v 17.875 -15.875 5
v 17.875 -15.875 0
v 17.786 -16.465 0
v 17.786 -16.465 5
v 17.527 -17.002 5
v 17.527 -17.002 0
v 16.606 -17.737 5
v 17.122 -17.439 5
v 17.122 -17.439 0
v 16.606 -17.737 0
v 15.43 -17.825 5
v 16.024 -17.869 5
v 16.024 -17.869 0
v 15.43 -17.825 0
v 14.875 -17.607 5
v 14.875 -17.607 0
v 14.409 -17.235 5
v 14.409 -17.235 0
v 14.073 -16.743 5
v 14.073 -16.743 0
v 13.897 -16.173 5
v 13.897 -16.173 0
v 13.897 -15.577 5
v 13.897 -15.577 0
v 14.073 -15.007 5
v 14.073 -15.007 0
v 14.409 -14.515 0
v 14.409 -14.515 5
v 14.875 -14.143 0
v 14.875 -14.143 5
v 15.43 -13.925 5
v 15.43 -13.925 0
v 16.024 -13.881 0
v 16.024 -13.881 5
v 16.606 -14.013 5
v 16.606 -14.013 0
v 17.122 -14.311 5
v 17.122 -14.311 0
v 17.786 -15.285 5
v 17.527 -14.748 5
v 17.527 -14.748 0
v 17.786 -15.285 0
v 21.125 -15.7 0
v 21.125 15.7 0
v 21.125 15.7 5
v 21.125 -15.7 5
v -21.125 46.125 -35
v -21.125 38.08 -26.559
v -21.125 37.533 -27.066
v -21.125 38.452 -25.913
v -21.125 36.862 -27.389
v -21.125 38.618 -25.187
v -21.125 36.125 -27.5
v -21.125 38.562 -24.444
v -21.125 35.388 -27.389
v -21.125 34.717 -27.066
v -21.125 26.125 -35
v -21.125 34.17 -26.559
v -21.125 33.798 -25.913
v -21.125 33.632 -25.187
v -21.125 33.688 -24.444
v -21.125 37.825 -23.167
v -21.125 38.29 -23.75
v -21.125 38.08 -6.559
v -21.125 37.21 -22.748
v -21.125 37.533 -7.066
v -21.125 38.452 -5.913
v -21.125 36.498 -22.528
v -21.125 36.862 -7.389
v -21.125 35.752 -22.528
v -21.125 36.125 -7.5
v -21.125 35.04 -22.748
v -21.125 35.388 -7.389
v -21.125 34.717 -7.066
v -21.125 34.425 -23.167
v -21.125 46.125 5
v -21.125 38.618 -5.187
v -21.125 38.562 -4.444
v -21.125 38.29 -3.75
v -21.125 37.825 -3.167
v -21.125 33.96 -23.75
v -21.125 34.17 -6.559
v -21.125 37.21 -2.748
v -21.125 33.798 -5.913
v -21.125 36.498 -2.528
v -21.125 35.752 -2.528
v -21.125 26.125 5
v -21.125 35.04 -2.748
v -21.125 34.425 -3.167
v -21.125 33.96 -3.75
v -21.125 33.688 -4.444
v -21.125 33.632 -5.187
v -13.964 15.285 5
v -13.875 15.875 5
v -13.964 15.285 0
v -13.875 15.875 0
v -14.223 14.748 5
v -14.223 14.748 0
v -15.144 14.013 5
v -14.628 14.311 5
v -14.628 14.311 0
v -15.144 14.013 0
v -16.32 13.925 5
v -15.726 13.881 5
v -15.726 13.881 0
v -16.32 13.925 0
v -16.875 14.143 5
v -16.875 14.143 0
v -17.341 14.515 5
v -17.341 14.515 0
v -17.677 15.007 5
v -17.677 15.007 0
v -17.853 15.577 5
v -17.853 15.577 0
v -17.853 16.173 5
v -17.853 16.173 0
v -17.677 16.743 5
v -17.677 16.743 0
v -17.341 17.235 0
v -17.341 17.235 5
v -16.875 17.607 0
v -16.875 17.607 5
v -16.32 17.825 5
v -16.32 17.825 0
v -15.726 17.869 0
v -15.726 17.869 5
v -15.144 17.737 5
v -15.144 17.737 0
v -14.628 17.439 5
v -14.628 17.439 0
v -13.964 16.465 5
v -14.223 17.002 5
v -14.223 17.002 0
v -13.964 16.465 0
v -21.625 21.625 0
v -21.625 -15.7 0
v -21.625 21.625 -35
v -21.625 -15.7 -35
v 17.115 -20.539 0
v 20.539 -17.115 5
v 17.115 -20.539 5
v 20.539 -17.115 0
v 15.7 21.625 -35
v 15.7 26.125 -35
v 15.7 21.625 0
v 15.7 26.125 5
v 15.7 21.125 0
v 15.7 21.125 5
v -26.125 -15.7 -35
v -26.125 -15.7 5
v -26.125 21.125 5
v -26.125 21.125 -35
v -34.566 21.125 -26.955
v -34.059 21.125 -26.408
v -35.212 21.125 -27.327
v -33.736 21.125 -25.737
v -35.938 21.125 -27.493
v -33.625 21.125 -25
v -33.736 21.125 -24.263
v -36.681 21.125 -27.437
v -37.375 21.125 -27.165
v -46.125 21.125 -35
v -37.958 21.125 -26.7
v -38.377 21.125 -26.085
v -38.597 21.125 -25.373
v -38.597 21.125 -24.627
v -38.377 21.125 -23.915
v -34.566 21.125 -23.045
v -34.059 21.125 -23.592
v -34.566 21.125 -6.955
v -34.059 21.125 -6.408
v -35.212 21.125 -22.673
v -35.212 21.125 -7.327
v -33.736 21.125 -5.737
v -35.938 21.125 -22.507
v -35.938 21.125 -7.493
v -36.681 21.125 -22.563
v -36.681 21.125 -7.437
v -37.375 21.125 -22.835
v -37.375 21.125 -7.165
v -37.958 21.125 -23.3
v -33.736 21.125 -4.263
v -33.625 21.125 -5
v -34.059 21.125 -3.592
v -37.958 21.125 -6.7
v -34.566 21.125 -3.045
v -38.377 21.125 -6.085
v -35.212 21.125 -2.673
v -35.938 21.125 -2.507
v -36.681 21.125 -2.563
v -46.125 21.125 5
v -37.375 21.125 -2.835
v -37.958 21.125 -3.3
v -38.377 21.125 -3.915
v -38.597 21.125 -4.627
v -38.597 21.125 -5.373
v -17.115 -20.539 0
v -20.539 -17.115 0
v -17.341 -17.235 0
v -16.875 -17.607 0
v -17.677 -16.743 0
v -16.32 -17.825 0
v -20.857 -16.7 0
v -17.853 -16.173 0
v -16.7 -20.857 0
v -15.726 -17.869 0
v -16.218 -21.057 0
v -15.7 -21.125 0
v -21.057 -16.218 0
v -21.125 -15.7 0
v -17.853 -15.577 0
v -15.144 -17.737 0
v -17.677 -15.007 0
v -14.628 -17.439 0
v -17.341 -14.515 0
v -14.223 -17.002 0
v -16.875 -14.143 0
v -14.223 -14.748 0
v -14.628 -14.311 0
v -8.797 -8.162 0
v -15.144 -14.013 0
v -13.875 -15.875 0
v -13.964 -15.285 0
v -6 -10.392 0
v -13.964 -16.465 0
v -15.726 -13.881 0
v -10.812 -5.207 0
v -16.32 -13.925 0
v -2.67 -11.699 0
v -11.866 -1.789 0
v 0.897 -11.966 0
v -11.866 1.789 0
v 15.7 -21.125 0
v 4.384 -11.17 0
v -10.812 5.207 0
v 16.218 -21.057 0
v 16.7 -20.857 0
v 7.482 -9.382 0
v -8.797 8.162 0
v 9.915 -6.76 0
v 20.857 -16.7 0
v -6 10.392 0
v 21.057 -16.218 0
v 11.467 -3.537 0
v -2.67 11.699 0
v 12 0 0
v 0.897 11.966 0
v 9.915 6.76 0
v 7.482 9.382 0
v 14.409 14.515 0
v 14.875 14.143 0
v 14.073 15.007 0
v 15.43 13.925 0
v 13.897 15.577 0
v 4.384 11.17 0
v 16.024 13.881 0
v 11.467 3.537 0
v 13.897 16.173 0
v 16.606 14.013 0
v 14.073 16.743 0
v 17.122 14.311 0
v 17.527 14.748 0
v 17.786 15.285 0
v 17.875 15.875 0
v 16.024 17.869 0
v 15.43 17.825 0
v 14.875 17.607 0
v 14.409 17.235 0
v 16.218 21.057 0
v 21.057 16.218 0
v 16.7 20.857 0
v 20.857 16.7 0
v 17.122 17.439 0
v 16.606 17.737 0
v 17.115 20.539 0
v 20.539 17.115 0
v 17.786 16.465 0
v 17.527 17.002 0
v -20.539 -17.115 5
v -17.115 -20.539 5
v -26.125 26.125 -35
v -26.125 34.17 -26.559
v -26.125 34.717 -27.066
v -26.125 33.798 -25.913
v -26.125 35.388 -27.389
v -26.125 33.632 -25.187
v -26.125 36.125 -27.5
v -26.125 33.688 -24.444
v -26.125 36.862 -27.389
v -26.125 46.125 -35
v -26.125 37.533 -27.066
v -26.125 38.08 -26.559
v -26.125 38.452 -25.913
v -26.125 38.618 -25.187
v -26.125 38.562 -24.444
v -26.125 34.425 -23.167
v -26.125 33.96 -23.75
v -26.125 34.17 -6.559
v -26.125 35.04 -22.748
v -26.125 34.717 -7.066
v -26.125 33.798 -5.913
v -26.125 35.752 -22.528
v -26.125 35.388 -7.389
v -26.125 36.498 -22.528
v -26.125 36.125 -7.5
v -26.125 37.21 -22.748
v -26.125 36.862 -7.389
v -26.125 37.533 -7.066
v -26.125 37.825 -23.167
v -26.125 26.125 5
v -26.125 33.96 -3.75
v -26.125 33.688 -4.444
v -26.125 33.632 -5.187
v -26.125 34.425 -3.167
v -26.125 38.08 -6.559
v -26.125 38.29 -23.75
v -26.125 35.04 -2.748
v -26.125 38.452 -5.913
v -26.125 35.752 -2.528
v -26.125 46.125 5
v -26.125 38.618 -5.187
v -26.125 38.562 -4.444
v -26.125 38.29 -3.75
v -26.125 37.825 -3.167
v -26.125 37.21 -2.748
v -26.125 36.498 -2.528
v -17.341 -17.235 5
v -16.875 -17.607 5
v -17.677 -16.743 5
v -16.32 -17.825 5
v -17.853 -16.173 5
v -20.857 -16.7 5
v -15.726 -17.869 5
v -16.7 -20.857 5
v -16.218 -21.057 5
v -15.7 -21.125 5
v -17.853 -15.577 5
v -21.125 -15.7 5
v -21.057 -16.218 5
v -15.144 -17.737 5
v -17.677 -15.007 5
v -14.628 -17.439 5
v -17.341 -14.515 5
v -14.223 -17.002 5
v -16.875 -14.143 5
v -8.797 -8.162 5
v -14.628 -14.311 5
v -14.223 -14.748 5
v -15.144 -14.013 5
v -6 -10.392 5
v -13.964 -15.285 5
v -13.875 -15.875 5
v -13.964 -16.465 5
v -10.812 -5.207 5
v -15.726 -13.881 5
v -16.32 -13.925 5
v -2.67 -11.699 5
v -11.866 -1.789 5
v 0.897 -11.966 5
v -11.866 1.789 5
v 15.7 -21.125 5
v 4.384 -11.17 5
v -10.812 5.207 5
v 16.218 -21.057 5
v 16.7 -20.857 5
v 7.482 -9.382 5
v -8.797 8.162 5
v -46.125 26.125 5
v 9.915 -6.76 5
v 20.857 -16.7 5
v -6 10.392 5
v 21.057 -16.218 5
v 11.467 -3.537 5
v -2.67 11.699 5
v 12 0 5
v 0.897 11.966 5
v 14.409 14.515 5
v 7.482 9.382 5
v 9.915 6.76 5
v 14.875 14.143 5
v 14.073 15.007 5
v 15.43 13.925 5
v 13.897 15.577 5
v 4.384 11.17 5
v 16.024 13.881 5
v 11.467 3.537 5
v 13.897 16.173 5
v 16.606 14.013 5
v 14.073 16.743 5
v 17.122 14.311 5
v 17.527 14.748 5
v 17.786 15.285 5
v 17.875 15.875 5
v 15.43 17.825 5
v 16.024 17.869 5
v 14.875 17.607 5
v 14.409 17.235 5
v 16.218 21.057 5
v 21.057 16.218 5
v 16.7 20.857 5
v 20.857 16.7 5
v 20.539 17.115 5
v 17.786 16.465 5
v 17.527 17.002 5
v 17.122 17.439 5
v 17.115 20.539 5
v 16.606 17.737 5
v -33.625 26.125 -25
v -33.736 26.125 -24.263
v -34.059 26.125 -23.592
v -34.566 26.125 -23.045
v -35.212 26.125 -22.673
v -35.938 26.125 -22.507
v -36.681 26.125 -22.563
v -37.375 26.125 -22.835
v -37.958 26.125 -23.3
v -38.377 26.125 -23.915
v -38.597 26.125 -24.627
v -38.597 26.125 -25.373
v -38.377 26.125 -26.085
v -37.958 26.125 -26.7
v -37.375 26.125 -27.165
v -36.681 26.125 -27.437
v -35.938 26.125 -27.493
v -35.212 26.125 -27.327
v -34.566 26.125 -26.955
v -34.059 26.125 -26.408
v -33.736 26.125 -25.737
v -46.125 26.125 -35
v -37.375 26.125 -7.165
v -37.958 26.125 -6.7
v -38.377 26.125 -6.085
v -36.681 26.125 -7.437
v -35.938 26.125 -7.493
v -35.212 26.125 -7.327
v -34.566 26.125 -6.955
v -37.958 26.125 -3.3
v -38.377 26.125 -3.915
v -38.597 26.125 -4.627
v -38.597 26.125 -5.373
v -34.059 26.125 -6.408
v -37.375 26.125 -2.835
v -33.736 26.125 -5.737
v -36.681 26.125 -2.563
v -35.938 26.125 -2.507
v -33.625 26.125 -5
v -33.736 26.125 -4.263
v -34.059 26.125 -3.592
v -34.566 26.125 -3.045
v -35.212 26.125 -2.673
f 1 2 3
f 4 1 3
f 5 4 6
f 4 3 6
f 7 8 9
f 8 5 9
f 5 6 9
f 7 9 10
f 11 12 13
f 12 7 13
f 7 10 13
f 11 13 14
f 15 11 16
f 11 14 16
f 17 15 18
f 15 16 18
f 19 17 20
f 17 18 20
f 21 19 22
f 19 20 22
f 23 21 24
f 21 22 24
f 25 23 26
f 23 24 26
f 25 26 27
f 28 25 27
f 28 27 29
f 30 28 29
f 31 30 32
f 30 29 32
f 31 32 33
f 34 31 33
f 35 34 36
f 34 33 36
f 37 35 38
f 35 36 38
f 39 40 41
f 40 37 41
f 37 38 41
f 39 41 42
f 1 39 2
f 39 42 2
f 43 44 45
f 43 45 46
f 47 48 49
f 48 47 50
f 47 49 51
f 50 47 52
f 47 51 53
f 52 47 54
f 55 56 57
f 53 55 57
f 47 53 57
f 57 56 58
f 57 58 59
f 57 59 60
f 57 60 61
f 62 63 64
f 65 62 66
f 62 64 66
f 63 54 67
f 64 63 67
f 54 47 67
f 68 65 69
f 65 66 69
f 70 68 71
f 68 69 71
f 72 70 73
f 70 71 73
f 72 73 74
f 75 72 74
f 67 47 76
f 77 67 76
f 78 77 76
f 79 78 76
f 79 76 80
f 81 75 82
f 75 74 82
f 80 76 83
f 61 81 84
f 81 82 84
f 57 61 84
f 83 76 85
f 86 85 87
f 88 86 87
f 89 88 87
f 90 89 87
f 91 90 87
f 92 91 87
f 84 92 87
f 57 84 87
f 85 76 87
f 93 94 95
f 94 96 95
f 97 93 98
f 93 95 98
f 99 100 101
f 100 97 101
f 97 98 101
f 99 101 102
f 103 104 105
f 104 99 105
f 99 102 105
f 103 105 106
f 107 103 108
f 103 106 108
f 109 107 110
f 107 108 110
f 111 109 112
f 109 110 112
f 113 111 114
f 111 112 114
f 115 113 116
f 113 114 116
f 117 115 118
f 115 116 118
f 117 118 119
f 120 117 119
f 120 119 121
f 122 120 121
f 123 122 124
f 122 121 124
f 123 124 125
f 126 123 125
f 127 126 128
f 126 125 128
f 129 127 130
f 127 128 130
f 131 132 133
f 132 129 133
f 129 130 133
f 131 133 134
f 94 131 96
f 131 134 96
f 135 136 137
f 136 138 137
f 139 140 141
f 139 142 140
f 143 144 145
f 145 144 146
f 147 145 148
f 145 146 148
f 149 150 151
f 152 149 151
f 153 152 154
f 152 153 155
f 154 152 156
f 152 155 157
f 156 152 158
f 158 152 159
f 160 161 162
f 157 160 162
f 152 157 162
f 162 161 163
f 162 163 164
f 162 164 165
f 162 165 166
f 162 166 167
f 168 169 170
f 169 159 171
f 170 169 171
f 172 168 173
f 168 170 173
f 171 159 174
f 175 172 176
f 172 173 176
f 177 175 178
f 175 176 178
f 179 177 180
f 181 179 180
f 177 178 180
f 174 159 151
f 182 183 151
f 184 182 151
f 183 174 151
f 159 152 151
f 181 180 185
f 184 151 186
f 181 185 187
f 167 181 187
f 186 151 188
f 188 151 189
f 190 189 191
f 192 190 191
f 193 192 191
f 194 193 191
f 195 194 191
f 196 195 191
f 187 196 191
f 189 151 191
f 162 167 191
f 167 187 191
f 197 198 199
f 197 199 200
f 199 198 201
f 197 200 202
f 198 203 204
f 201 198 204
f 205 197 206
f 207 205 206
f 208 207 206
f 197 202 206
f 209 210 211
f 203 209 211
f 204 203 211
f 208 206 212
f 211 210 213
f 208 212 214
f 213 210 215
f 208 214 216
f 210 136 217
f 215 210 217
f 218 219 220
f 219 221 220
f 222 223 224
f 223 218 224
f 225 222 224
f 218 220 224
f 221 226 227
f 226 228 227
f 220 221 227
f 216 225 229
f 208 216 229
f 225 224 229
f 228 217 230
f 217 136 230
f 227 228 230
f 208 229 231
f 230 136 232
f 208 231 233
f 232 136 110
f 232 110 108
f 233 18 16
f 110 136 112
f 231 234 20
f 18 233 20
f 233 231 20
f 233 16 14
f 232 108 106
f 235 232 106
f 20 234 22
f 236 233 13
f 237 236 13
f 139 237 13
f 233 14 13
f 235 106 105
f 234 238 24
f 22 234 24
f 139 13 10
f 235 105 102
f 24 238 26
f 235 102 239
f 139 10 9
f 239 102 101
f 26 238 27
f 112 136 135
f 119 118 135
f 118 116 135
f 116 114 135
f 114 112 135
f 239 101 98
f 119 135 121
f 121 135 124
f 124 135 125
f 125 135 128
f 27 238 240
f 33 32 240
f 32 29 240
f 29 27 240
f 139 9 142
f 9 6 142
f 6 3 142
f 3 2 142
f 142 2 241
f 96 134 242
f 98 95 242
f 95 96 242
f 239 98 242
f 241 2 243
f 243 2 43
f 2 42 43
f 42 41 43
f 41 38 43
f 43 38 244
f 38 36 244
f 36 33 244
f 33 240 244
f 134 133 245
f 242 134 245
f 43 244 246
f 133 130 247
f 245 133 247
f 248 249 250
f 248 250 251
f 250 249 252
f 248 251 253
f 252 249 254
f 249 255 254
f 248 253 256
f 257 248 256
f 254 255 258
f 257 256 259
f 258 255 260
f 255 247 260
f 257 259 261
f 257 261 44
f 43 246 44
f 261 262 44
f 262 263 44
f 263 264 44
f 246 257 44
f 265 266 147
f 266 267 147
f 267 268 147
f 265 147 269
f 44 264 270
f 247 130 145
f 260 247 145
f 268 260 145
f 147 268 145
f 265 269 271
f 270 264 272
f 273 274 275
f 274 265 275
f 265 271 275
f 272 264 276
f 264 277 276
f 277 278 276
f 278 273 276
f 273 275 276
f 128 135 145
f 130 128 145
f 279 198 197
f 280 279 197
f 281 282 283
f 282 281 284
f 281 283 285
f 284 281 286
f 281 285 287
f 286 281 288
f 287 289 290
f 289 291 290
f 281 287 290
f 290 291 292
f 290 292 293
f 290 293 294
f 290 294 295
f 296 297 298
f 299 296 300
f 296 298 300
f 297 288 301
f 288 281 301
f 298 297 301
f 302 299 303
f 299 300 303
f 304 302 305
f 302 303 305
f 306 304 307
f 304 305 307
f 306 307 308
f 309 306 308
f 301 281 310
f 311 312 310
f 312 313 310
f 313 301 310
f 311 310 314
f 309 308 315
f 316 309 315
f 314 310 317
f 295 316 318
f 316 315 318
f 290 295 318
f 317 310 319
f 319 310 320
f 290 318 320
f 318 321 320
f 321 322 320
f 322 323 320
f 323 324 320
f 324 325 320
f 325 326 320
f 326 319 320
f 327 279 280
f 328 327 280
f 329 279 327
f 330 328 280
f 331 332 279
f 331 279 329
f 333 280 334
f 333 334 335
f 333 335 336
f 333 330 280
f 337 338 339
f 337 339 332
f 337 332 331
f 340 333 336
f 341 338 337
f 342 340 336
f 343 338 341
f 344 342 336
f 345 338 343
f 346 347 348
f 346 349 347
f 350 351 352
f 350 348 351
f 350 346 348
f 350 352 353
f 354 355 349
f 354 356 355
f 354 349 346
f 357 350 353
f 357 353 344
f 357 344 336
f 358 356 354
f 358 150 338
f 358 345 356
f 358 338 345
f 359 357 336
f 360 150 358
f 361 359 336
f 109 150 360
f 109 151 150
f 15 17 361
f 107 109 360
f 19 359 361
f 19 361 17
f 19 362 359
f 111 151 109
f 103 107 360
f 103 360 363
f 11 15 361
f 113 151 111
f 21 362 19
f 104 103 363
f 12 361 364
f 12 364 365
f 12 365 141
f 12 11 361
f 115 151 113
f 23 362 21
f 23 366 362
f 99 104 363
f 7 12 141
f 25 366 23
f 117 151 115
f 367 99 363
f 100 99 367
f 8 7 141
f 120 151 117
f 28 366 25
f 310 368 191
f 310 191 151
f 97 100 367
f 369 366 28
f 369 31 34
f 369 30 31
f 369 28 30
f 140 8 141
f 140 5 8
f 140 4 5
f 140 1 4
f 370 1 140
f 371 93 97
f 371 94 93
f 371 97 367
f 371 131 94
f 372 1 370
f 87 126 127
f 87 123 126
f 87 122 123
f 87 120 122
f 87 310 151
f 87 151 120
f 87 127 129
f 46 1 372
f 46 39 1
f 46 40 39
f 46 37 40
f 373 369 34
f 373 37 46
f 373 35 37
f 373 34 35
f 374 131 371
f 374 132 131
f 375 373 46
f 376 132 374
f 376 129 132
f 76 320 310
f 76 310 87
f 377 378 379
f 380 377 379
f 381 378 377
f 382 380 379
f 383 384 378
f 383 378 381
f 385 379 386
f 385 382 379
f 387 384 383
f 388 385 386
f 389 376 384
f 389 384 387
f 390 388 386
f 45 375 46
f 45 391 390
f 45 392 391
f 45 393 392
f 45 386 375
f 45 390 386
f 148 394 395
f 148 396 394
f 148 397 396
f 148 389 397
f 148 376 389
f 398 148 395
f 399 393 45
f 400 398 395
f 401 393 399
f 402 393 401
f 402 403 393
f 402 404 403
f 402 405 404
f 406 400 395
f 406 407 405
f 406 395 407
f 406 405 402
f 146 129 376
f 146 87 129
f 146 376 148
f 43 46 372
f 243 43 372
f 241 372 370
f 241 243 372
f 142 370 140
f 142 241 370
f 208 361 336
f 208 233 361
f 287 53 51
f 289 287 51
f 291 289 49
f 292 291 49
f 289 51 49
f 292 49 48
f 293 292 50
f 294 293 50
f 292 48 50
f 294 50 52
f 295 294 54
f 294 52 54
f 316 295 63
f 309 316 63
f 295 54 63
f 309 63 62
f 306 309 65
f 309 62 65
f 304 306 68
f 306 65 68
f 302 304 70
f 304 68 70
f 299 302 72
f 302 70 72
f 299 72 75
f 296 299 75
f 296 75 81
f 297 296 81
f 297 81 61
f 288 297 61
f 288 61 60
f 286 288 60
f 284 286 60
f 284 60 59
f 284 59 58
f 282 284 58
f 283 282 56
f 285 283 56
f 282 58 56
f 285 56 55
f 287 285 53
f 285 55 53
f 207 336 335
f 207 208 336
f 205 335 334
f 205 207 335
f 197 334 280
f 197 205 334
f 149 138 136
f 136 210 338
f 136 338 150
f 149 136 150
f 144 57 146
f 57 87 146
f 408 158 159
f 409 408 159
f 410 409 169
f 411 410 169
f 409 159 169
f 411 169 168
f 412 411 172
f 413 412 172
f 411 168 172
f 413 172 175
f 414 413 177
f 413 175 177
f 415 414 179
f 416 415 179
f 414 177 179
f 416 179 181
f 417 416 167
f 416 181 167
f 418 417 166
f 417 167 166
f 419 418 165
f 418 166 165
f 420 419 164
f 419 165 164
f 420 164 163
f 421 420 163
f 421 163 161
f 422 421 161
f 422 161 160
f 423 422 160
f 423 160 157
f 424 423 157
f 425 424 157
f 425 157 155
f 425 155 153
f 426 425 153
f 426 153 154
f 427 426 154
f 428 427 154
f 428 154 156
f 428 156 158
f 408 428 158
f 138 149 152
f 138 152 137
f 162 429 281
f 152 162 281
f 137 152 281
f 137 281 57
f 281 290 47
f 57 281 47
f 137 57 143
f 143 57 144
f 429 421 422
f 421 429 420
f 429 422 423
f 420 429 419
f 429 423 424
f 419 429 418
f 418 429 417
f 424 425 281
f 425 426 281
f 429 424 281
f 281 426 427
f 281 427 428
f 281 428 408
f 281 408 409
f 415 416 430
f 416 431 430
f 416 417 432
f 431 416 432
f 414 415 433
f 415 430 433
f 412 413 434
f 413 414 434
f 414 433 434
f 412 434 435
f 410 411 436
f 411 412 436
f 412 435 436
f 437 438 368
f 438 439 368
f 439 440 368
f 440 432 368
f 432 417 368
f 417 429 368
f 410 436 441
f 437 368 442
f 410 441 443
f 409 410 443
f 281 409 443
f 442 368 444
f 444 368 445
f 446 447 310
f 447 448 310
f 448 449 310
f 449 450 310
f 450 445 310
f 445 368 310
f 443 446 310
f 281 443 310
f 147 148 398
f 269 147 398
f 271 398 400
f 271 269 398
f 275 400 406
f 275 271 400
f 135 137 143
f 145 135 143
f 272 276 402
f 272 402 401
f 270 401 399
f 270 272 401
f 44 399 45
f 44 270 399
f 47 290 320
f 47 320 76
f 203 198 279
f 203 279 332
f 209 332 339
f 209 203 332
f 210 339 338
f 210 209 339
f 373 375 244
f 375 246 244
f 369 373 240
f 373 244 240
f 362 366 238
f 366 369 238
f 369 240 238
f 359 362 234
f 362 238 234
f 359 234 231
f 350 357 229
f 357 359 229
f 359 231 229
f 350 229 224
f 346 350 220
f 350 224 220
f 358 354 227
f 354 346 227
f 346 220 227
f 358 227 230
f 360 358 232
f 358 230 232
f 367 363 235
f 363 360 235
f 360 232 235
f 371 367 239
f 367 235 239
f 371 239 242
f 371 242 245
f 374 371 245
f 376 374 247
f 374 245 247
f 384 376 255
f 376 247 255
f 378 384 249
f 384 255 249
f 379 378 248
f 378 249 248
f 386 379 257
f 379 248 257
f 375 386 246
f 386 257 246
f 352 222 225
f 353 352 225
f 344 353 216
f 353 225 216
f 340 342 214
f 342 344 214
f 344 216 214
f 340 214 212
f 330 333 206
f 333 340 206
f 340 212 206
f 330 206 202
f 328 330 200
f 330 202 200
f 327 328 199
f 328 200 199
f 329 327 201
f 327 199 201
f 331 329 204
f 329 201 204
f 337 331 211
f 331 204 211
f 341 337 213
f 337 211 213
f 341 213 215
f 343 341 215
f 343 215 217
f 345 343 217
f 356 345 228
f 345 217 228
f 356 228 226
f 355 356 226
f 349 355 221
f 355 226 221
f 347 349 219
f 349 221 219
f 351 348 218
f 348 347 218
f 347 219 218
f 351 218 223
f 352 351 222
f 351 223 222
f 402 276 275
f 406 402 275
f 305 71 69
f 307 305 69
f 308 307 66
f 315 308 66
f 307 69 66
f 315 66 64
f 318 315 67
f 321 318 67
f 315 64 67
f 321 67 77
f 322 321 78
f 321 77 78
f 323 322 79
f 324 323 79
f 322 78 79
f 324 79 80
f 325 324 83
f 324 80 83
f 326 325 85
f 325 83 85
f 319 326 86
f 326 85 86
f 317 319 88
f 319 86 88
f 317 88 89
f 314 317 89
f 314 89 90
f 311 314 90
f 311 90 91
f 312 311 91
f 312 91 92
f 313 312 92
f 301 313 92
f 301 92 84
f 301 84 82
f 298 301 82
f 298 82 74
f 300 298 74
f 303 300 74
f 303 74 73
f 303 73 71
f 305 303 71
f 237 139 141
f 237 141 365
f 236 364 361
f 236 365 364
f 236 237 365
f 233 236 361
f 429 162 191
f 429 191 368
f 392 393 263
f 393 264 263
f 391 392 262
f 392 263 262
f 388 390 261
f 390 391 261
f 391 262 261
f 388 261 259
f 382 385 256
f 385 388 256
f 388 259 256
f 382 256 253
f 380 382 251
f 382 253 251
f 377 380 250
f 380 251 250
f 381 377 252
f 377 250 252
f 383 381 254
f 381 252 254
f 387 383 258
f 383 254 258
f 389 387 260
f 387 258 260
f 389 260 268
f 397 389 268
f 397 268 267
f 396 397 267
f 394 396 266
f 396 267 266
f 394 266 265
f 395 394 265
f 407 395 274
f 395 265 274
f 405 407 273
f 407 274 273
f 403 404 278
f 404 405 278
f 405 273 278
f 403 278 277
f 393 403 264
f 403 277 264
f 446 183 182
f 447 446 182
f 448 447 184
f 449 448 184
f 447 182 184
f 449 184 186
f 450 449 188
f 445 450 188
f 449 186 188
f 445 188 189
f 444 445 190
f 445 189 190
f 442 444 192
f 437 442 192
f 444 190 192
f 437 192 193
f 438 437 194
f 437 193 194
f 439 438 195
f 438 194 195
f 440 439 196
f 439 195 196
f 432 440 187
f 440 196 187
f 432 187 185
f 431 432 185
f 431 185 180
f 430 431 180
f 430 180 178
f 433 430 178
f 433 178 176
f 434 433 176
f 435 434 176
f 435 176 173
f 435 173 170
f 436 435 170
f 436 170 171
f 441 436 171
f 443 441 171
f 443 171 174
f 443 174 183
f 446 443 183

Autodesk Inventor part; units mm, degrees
ref_plane "YZ Plane" through (0, 0, 0) normal (1, 0, 0) x (0, 1, 0)
ref_plane "XZ Plane" through (0, 0, 0) normal (0, 1, 0) x (-1, 0, 0)
ref_plane "XY Plane" through (0, 0, 0) normal (0, 0, 1) x (1, 0, 0)
sketch "Sketch1" plane through (0, 0, 0) normal (0, 0, 1) x (1, 0, 0)
  arc A0 (-20.5392, 17.1146) -> (-21.125, 15.7004) centre (-19.125, 15.7004) ccw projected
  line L0 (-21.125, -15.7004) -> (-21.125, 15.7004) projected
  arc A1 (-21.125, -15.7004) -> (-20.5392, -17.1146) centre (-19.125, -15.7004) ccw projected
  line L1 (-20.5392, -17.1146) -> (-17.1146, -20.5392) projected
  arc A2 (-17.1146, -20.5392) -> (-15.7004, -21.125) centre (-15.7004, -19.125) ccw projected
  line L2 (15.7004, -21.125) -> (-15.7004, -21.125) projected
  arc A3 (15.7004, -21.125) -> (17.1146, -20.5392) centre (15.7004, -19.125) ccw projected
  line L3 (20.5392, -17.1146) -> (17.1146, -20.5392) projected
  arc A4 (20.5392, -17.1146) -> (21.125, -15.7004) centre (19.125, -15.7004) ccw projected
  line L4 (21.125, 15.7004) -> (21.125, -15.7004) projected
  arc A5 (21.125, 15.7004) -> (20.5392, 17.1146) centre (19.125, 15.7004) ccw projected
  line L5 (20.5392, 17.1146) -> (17.1146, 20.5392) projected
  arc A6 (17.1146, 20.5392) -> (15.7004, 21.125) centre (15.7004, 19.125) ccw projected
  line L6 (-15.7004, 21.125) -> (15.7004, 21.125) projected
  arc A7 (-15.7004, 21.125) -> (-17.1146, 20.5392) centre (-15.7004, 19.125) ccw projected
  line L7 (-20.5392, 17.1146) -> (-17.1146, 20.5392) projected
  circle A8 centre (0, 0) radius 16 projected
  circle A9 centre (-15.875, -15.875) radius 1.625 projected
  circle A10 centre (15.875, 15.875) radius 1.625 projected
  circle A11 centre (-15.875, 15.875) radius 1.625 projected
  circle A12 centre (15.875, -15.875) radius 1.625 projected
  circle A13 centre (0, 0) radius 12
  circle A14 centre (-15.875, 15.875) radius 2
  circle A15 centre (15.875, 15.875) radius 2
  circle A16 centre (15.875, -15.875) radius 2
  circle A17 centre (-15.875, -15.875) radius 2
  point P0 (0, 0)
  dimension "d0" = 24
  dimension "d1" = 4
  dimension "d2" = 4
  dimension "d3" = 4
  dimension "d4" = 4
extrude "Extrusion1" add sketch "Sketch1" along normal blind 5 contours L7 A7 L6 A6 L5 A5 L4 A4 L3 A3 L2 A2 L1 A1 L0 A0 | A8
sketch "Sketch3" plane through (0, 0, 5) normal (0, 0, 1) x (1, 0, 0)
  line L0 (-15.7004, 21.125) -> (15.7004, 21.125) projected
  line L1 (15.7004, 21.125) -> (-46.125, 21.125)
  line L2 (-46.125, 21.125) -> (-46.125, 26.125)
  line L3 (-46.125, 26.125) -> (15.7004, 26.125)
  line L4 (15.7004, 26.125) -> (15.7004, 21.125)
  line L5 (-21.125, 15.7004) -> (-21.125, -15.7004) projected
  line L6 (-21.125, -15.7004) -> (-26.125, -15.7004)
  line L7 (-26.125, -15.7004) -> (-26.125, 46.125)
  line L8 (-26.125, 46.125) -> (-21.125, 46.125)
  line L9 (-21.125, 46.125) -> (-21.125, -15.7004)
  point P0 (0, 0)
  dimension "d11" = 5
  dimension "d12" = 5
  dimension "d13" = 20
  dimension "d14" = 20
extrude "Extrusion3" add sketch "Sketch3" against normal blind 40
sketch "Sketch4" plane through (0, 0, 5) normal (0, 0, 1) x (1, 0, 0)
  arc A0 (-15.7004, 21.125) -> (-17.1146, 20.5392) centre (-15.7004, 19.125) ccw projected
  line L0 (-17.1146, 20.5392) -> (-20.5392, 17.1146) projected
  arc A1 (-20.5392, 17.1146) -> (-21.125, 15.7004) centre (-19.125, 15.7004) ccw projected
  line L1 (-21.125, 21.125) -> (-21.125, 15.7004) projected
  line L2 (-15.7004, 21.125) -> (-21.125, 21.125) projected
  circle A2 centre (0, 0) radius 12 projected
  circle A3 centre (-15.875, -15.875) radius 2 projected
  circle A4 centre (15.875, -15.875) radius 2 projected
  circle A5 centre (15.875, 15.875) radius 2 projected
  circle A6 centre (-15.875, 15.875) radius 2 projected
  line L3 (15.7004, 26.125) -> (15.7004, 21.125) projected
  line L4 (-21.125, 26.125) -> (15.7004, 26.125) projected
  line L5 (-21.125, 46.125) -> (-21.125, 26.125) projected
  line L6 (-26.125, 46.125) -> (-21.125, 46.125) projected
  line L7 (-26.125, 26.125) -> (-26.125, 46.125) projected
  line L8 (-46.125, 26.125) -> (-26.125, 26.125) projected
  line L9 (-46.125, 21.125) -> (-46.125, 26.125) projected
  line L10 (-26.125, 21.125) -> (-46.125, 21.125) projected
  line L11 (-26.125, -15.7004) -> (-26.125, 21.125) projected
  line L12 (-21.125, -15.7004) -> (-26.125, -15.7004) projected
  arc A7 (-21.125, -15.7004) -> (-20.5392, -17.1146) centre (-19.125, -15.7004) ccw projected
  line L13 (-20.5392, -17.1146) -> (-17.1146, -20.5392) projected
  arc A8 (-17.1146, -20.5392) -> (-15.7004, -21.125) centre (-15.7004, -19.125) ccw projected
  line L14 (-15.7004, -21.125) -> (15.7004, -21.125) projected
  arc A9 (15.7004, -21.125) -> (17.1146, -20.5392) centre (15.7004, -19.125) ccw projected
  line L15 (17.1146, -20.5392) -> (20.5392, -17.1146) projected
  arc A10 (20.5392, -17.1146) -> (21.125, -15.7004) centre (19.125, -15.7004) ccw projected
  line L16 (21.125, -15.7004) -> (21.125, 15.7004) projected
  arc A11 (21.125, 15.7004) -> (20.5392, 17.1146) centre (19.125, 15.7004) ccw projected
  line L17 (20.5392, 17.1146) -> (17.1146, 20.5392) projected
  arc A12 (17.1146, 20.5392) -> (15.7004, 21.125) centre (15.7004, 19.125) ccw projected
  point P0 (0, 0)
extrude "Extrusion4" add sketch "Sketch4" against normal blind 5 contours A0 L0 A1 L1 L2
sketch "Sketch5" plane through (-21.125, 26.125, 5) normal (1, 0, 0) x (0, 0, -1)
  circle A0 centre (10, 10) radius 2.5
  circle A1 centre (30, 10) radius 2.5
  line L0 (0, 20) -> (40, 20) projected
  line L1 (0, 20) -> (0, 0) projected
  point P0 (5, -26.125)
  dimension "d19" = 5
  dimension "d20" = 5
  dimension "d21" = 10
  dimension "d22" = 10
  dimension "d23" = 20
  dimension "d24" = 10
extrude "Extrusion5" cut sketch "Sketch5" against normal through all
sketch "Sketch6" plane through (-46.125, 21.125, 5) normal (0, -1, 0) x (1, 0, 0)
  circle A0 centre (10, -30) radius 2.5
  circle A1 centre (10, -10) radius 2.5
  line L0 (0, 0) -> (0, -40) projected
  line L1 (20, 0) -> (0, 0) projected
  point P0 (46.125, -5)
  dimension "d27" = 10
  dimension "d28" = 10
  dimension "d29" = 5
  dimension "d30" = 5
  dimension "d31" = 20
  dimension "d32" = 10
extrude "Extrusion6" cut sketch "Sketch6" against normal through all
sketch "Sketch7" plane through (0, 0, -35) normal (0, 0, -1) x (-1, 0, 0)
  line L0 (21.625, 21.625) -> (-23.2924, 21.625)
  line L1 (-23.2924, 21.625) -> (-23.2924, -21.9013)
  line L2 (-23.2924, -21.9013) -> (21.625, -21.9013)
  line L3 (21.625, -21.9013) -> (21.625, 21.625)
  line L4 (-15.7004, 21.125) -> (21.125, 21.125) projected
  line L5 (21.125, 21.125) -> (21.125, -15.7004) projected
  point P0 (0, 0)
  dimension "d35" = 0.5
  dimension "d36" = 0.5
extrude "Extrusion7" cut sketch "Sketch7" against normal blind 35
equation "\"d36\" = d35"
properties part number "StepperXYHolder"
